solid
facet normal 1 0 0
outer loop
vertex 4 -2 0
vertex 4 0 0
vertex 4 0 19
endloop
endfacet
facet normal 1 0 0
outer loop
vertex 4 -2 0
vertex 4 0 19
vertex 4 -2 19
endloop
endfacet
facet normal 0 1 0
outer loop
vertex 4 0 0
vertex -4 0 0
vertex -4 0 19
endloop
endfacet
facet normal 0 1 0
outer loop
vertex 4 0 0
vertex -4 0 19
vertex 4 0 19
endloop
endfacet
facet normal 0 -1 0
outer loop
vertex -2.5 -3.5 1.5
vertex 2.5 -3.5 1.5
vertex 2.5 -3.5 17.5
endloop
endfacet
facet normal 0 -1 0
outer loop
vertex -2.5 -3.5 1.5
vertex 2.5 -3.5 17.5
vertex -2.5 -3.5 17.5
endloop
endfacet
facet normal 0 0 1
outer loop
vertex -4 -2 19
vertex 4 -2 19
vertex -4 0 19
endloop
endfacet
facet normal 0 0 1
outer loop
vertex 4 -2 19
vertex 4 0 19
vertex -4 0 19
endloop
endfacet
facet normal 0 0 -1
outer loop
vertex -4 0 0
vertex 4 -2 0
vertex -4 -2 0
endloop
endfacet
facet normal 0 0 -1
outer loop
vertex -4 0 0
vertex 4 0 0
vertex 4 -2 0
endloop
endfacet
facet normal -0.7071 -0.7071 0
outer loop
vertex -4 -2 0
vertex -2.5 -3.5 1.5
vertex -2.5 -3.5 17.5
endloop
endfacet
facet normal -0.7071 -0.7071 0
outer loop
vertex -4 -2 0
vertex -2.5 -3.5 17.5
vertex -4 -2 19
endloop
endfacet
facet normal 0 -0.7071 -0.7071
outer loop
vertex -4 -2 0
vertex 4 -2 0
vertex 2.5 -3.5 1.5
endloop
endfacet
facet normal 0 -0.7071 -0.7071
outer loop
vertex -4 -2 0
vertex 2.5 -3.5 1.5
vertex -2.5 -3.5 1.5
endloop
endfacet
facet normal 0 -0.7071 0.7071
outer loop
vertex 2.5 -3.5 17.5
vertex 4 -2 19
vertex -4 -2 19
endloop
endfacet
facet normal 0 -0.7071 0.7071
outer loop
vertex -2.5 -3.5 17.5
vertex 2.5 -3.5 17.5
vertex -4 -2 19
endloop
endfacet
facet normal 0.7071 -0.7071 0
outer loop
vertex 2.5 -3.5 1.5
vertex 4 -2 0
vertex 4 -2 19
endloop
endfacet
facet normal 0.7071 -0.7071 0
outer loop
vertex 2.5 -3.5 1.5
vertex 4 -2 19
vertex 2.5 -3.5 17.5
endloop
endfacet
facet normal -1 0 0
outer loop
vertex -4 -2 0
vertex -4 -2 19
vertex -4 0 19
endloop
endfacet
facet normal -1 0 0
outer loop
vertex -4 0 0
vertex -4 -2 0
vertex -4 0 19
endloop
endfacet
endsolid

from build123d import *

# Parameters (mm, degrees)
BOSS_EXTRU_1_DEPTH = 19
CHANFREIN1_SIZE    = 1.5


with BuildPart() as part:
    # Esquisse1 → Boss.-Extru.1 (new body)
    with BuildSketch(Plane.XY):
        Polygon((-4, 0), (4, 0), (4, -2), (2.5, -3.5), (-2.5, -3.5), (-4, -2), align=None)
    extrude(amount=BOSS_EXTRU_1_DEPTH)

    # Chanfrein1
    chanfrein1_edges = [part.edges().sort_by_distance(p)[0] for p in [
        (0, -3.5, 0),
        (0, -3.5, 19),
    ]]
    chamfer(chanfrein1_edges, length=CHANFREIN1_SIZE)


solid = part.part
